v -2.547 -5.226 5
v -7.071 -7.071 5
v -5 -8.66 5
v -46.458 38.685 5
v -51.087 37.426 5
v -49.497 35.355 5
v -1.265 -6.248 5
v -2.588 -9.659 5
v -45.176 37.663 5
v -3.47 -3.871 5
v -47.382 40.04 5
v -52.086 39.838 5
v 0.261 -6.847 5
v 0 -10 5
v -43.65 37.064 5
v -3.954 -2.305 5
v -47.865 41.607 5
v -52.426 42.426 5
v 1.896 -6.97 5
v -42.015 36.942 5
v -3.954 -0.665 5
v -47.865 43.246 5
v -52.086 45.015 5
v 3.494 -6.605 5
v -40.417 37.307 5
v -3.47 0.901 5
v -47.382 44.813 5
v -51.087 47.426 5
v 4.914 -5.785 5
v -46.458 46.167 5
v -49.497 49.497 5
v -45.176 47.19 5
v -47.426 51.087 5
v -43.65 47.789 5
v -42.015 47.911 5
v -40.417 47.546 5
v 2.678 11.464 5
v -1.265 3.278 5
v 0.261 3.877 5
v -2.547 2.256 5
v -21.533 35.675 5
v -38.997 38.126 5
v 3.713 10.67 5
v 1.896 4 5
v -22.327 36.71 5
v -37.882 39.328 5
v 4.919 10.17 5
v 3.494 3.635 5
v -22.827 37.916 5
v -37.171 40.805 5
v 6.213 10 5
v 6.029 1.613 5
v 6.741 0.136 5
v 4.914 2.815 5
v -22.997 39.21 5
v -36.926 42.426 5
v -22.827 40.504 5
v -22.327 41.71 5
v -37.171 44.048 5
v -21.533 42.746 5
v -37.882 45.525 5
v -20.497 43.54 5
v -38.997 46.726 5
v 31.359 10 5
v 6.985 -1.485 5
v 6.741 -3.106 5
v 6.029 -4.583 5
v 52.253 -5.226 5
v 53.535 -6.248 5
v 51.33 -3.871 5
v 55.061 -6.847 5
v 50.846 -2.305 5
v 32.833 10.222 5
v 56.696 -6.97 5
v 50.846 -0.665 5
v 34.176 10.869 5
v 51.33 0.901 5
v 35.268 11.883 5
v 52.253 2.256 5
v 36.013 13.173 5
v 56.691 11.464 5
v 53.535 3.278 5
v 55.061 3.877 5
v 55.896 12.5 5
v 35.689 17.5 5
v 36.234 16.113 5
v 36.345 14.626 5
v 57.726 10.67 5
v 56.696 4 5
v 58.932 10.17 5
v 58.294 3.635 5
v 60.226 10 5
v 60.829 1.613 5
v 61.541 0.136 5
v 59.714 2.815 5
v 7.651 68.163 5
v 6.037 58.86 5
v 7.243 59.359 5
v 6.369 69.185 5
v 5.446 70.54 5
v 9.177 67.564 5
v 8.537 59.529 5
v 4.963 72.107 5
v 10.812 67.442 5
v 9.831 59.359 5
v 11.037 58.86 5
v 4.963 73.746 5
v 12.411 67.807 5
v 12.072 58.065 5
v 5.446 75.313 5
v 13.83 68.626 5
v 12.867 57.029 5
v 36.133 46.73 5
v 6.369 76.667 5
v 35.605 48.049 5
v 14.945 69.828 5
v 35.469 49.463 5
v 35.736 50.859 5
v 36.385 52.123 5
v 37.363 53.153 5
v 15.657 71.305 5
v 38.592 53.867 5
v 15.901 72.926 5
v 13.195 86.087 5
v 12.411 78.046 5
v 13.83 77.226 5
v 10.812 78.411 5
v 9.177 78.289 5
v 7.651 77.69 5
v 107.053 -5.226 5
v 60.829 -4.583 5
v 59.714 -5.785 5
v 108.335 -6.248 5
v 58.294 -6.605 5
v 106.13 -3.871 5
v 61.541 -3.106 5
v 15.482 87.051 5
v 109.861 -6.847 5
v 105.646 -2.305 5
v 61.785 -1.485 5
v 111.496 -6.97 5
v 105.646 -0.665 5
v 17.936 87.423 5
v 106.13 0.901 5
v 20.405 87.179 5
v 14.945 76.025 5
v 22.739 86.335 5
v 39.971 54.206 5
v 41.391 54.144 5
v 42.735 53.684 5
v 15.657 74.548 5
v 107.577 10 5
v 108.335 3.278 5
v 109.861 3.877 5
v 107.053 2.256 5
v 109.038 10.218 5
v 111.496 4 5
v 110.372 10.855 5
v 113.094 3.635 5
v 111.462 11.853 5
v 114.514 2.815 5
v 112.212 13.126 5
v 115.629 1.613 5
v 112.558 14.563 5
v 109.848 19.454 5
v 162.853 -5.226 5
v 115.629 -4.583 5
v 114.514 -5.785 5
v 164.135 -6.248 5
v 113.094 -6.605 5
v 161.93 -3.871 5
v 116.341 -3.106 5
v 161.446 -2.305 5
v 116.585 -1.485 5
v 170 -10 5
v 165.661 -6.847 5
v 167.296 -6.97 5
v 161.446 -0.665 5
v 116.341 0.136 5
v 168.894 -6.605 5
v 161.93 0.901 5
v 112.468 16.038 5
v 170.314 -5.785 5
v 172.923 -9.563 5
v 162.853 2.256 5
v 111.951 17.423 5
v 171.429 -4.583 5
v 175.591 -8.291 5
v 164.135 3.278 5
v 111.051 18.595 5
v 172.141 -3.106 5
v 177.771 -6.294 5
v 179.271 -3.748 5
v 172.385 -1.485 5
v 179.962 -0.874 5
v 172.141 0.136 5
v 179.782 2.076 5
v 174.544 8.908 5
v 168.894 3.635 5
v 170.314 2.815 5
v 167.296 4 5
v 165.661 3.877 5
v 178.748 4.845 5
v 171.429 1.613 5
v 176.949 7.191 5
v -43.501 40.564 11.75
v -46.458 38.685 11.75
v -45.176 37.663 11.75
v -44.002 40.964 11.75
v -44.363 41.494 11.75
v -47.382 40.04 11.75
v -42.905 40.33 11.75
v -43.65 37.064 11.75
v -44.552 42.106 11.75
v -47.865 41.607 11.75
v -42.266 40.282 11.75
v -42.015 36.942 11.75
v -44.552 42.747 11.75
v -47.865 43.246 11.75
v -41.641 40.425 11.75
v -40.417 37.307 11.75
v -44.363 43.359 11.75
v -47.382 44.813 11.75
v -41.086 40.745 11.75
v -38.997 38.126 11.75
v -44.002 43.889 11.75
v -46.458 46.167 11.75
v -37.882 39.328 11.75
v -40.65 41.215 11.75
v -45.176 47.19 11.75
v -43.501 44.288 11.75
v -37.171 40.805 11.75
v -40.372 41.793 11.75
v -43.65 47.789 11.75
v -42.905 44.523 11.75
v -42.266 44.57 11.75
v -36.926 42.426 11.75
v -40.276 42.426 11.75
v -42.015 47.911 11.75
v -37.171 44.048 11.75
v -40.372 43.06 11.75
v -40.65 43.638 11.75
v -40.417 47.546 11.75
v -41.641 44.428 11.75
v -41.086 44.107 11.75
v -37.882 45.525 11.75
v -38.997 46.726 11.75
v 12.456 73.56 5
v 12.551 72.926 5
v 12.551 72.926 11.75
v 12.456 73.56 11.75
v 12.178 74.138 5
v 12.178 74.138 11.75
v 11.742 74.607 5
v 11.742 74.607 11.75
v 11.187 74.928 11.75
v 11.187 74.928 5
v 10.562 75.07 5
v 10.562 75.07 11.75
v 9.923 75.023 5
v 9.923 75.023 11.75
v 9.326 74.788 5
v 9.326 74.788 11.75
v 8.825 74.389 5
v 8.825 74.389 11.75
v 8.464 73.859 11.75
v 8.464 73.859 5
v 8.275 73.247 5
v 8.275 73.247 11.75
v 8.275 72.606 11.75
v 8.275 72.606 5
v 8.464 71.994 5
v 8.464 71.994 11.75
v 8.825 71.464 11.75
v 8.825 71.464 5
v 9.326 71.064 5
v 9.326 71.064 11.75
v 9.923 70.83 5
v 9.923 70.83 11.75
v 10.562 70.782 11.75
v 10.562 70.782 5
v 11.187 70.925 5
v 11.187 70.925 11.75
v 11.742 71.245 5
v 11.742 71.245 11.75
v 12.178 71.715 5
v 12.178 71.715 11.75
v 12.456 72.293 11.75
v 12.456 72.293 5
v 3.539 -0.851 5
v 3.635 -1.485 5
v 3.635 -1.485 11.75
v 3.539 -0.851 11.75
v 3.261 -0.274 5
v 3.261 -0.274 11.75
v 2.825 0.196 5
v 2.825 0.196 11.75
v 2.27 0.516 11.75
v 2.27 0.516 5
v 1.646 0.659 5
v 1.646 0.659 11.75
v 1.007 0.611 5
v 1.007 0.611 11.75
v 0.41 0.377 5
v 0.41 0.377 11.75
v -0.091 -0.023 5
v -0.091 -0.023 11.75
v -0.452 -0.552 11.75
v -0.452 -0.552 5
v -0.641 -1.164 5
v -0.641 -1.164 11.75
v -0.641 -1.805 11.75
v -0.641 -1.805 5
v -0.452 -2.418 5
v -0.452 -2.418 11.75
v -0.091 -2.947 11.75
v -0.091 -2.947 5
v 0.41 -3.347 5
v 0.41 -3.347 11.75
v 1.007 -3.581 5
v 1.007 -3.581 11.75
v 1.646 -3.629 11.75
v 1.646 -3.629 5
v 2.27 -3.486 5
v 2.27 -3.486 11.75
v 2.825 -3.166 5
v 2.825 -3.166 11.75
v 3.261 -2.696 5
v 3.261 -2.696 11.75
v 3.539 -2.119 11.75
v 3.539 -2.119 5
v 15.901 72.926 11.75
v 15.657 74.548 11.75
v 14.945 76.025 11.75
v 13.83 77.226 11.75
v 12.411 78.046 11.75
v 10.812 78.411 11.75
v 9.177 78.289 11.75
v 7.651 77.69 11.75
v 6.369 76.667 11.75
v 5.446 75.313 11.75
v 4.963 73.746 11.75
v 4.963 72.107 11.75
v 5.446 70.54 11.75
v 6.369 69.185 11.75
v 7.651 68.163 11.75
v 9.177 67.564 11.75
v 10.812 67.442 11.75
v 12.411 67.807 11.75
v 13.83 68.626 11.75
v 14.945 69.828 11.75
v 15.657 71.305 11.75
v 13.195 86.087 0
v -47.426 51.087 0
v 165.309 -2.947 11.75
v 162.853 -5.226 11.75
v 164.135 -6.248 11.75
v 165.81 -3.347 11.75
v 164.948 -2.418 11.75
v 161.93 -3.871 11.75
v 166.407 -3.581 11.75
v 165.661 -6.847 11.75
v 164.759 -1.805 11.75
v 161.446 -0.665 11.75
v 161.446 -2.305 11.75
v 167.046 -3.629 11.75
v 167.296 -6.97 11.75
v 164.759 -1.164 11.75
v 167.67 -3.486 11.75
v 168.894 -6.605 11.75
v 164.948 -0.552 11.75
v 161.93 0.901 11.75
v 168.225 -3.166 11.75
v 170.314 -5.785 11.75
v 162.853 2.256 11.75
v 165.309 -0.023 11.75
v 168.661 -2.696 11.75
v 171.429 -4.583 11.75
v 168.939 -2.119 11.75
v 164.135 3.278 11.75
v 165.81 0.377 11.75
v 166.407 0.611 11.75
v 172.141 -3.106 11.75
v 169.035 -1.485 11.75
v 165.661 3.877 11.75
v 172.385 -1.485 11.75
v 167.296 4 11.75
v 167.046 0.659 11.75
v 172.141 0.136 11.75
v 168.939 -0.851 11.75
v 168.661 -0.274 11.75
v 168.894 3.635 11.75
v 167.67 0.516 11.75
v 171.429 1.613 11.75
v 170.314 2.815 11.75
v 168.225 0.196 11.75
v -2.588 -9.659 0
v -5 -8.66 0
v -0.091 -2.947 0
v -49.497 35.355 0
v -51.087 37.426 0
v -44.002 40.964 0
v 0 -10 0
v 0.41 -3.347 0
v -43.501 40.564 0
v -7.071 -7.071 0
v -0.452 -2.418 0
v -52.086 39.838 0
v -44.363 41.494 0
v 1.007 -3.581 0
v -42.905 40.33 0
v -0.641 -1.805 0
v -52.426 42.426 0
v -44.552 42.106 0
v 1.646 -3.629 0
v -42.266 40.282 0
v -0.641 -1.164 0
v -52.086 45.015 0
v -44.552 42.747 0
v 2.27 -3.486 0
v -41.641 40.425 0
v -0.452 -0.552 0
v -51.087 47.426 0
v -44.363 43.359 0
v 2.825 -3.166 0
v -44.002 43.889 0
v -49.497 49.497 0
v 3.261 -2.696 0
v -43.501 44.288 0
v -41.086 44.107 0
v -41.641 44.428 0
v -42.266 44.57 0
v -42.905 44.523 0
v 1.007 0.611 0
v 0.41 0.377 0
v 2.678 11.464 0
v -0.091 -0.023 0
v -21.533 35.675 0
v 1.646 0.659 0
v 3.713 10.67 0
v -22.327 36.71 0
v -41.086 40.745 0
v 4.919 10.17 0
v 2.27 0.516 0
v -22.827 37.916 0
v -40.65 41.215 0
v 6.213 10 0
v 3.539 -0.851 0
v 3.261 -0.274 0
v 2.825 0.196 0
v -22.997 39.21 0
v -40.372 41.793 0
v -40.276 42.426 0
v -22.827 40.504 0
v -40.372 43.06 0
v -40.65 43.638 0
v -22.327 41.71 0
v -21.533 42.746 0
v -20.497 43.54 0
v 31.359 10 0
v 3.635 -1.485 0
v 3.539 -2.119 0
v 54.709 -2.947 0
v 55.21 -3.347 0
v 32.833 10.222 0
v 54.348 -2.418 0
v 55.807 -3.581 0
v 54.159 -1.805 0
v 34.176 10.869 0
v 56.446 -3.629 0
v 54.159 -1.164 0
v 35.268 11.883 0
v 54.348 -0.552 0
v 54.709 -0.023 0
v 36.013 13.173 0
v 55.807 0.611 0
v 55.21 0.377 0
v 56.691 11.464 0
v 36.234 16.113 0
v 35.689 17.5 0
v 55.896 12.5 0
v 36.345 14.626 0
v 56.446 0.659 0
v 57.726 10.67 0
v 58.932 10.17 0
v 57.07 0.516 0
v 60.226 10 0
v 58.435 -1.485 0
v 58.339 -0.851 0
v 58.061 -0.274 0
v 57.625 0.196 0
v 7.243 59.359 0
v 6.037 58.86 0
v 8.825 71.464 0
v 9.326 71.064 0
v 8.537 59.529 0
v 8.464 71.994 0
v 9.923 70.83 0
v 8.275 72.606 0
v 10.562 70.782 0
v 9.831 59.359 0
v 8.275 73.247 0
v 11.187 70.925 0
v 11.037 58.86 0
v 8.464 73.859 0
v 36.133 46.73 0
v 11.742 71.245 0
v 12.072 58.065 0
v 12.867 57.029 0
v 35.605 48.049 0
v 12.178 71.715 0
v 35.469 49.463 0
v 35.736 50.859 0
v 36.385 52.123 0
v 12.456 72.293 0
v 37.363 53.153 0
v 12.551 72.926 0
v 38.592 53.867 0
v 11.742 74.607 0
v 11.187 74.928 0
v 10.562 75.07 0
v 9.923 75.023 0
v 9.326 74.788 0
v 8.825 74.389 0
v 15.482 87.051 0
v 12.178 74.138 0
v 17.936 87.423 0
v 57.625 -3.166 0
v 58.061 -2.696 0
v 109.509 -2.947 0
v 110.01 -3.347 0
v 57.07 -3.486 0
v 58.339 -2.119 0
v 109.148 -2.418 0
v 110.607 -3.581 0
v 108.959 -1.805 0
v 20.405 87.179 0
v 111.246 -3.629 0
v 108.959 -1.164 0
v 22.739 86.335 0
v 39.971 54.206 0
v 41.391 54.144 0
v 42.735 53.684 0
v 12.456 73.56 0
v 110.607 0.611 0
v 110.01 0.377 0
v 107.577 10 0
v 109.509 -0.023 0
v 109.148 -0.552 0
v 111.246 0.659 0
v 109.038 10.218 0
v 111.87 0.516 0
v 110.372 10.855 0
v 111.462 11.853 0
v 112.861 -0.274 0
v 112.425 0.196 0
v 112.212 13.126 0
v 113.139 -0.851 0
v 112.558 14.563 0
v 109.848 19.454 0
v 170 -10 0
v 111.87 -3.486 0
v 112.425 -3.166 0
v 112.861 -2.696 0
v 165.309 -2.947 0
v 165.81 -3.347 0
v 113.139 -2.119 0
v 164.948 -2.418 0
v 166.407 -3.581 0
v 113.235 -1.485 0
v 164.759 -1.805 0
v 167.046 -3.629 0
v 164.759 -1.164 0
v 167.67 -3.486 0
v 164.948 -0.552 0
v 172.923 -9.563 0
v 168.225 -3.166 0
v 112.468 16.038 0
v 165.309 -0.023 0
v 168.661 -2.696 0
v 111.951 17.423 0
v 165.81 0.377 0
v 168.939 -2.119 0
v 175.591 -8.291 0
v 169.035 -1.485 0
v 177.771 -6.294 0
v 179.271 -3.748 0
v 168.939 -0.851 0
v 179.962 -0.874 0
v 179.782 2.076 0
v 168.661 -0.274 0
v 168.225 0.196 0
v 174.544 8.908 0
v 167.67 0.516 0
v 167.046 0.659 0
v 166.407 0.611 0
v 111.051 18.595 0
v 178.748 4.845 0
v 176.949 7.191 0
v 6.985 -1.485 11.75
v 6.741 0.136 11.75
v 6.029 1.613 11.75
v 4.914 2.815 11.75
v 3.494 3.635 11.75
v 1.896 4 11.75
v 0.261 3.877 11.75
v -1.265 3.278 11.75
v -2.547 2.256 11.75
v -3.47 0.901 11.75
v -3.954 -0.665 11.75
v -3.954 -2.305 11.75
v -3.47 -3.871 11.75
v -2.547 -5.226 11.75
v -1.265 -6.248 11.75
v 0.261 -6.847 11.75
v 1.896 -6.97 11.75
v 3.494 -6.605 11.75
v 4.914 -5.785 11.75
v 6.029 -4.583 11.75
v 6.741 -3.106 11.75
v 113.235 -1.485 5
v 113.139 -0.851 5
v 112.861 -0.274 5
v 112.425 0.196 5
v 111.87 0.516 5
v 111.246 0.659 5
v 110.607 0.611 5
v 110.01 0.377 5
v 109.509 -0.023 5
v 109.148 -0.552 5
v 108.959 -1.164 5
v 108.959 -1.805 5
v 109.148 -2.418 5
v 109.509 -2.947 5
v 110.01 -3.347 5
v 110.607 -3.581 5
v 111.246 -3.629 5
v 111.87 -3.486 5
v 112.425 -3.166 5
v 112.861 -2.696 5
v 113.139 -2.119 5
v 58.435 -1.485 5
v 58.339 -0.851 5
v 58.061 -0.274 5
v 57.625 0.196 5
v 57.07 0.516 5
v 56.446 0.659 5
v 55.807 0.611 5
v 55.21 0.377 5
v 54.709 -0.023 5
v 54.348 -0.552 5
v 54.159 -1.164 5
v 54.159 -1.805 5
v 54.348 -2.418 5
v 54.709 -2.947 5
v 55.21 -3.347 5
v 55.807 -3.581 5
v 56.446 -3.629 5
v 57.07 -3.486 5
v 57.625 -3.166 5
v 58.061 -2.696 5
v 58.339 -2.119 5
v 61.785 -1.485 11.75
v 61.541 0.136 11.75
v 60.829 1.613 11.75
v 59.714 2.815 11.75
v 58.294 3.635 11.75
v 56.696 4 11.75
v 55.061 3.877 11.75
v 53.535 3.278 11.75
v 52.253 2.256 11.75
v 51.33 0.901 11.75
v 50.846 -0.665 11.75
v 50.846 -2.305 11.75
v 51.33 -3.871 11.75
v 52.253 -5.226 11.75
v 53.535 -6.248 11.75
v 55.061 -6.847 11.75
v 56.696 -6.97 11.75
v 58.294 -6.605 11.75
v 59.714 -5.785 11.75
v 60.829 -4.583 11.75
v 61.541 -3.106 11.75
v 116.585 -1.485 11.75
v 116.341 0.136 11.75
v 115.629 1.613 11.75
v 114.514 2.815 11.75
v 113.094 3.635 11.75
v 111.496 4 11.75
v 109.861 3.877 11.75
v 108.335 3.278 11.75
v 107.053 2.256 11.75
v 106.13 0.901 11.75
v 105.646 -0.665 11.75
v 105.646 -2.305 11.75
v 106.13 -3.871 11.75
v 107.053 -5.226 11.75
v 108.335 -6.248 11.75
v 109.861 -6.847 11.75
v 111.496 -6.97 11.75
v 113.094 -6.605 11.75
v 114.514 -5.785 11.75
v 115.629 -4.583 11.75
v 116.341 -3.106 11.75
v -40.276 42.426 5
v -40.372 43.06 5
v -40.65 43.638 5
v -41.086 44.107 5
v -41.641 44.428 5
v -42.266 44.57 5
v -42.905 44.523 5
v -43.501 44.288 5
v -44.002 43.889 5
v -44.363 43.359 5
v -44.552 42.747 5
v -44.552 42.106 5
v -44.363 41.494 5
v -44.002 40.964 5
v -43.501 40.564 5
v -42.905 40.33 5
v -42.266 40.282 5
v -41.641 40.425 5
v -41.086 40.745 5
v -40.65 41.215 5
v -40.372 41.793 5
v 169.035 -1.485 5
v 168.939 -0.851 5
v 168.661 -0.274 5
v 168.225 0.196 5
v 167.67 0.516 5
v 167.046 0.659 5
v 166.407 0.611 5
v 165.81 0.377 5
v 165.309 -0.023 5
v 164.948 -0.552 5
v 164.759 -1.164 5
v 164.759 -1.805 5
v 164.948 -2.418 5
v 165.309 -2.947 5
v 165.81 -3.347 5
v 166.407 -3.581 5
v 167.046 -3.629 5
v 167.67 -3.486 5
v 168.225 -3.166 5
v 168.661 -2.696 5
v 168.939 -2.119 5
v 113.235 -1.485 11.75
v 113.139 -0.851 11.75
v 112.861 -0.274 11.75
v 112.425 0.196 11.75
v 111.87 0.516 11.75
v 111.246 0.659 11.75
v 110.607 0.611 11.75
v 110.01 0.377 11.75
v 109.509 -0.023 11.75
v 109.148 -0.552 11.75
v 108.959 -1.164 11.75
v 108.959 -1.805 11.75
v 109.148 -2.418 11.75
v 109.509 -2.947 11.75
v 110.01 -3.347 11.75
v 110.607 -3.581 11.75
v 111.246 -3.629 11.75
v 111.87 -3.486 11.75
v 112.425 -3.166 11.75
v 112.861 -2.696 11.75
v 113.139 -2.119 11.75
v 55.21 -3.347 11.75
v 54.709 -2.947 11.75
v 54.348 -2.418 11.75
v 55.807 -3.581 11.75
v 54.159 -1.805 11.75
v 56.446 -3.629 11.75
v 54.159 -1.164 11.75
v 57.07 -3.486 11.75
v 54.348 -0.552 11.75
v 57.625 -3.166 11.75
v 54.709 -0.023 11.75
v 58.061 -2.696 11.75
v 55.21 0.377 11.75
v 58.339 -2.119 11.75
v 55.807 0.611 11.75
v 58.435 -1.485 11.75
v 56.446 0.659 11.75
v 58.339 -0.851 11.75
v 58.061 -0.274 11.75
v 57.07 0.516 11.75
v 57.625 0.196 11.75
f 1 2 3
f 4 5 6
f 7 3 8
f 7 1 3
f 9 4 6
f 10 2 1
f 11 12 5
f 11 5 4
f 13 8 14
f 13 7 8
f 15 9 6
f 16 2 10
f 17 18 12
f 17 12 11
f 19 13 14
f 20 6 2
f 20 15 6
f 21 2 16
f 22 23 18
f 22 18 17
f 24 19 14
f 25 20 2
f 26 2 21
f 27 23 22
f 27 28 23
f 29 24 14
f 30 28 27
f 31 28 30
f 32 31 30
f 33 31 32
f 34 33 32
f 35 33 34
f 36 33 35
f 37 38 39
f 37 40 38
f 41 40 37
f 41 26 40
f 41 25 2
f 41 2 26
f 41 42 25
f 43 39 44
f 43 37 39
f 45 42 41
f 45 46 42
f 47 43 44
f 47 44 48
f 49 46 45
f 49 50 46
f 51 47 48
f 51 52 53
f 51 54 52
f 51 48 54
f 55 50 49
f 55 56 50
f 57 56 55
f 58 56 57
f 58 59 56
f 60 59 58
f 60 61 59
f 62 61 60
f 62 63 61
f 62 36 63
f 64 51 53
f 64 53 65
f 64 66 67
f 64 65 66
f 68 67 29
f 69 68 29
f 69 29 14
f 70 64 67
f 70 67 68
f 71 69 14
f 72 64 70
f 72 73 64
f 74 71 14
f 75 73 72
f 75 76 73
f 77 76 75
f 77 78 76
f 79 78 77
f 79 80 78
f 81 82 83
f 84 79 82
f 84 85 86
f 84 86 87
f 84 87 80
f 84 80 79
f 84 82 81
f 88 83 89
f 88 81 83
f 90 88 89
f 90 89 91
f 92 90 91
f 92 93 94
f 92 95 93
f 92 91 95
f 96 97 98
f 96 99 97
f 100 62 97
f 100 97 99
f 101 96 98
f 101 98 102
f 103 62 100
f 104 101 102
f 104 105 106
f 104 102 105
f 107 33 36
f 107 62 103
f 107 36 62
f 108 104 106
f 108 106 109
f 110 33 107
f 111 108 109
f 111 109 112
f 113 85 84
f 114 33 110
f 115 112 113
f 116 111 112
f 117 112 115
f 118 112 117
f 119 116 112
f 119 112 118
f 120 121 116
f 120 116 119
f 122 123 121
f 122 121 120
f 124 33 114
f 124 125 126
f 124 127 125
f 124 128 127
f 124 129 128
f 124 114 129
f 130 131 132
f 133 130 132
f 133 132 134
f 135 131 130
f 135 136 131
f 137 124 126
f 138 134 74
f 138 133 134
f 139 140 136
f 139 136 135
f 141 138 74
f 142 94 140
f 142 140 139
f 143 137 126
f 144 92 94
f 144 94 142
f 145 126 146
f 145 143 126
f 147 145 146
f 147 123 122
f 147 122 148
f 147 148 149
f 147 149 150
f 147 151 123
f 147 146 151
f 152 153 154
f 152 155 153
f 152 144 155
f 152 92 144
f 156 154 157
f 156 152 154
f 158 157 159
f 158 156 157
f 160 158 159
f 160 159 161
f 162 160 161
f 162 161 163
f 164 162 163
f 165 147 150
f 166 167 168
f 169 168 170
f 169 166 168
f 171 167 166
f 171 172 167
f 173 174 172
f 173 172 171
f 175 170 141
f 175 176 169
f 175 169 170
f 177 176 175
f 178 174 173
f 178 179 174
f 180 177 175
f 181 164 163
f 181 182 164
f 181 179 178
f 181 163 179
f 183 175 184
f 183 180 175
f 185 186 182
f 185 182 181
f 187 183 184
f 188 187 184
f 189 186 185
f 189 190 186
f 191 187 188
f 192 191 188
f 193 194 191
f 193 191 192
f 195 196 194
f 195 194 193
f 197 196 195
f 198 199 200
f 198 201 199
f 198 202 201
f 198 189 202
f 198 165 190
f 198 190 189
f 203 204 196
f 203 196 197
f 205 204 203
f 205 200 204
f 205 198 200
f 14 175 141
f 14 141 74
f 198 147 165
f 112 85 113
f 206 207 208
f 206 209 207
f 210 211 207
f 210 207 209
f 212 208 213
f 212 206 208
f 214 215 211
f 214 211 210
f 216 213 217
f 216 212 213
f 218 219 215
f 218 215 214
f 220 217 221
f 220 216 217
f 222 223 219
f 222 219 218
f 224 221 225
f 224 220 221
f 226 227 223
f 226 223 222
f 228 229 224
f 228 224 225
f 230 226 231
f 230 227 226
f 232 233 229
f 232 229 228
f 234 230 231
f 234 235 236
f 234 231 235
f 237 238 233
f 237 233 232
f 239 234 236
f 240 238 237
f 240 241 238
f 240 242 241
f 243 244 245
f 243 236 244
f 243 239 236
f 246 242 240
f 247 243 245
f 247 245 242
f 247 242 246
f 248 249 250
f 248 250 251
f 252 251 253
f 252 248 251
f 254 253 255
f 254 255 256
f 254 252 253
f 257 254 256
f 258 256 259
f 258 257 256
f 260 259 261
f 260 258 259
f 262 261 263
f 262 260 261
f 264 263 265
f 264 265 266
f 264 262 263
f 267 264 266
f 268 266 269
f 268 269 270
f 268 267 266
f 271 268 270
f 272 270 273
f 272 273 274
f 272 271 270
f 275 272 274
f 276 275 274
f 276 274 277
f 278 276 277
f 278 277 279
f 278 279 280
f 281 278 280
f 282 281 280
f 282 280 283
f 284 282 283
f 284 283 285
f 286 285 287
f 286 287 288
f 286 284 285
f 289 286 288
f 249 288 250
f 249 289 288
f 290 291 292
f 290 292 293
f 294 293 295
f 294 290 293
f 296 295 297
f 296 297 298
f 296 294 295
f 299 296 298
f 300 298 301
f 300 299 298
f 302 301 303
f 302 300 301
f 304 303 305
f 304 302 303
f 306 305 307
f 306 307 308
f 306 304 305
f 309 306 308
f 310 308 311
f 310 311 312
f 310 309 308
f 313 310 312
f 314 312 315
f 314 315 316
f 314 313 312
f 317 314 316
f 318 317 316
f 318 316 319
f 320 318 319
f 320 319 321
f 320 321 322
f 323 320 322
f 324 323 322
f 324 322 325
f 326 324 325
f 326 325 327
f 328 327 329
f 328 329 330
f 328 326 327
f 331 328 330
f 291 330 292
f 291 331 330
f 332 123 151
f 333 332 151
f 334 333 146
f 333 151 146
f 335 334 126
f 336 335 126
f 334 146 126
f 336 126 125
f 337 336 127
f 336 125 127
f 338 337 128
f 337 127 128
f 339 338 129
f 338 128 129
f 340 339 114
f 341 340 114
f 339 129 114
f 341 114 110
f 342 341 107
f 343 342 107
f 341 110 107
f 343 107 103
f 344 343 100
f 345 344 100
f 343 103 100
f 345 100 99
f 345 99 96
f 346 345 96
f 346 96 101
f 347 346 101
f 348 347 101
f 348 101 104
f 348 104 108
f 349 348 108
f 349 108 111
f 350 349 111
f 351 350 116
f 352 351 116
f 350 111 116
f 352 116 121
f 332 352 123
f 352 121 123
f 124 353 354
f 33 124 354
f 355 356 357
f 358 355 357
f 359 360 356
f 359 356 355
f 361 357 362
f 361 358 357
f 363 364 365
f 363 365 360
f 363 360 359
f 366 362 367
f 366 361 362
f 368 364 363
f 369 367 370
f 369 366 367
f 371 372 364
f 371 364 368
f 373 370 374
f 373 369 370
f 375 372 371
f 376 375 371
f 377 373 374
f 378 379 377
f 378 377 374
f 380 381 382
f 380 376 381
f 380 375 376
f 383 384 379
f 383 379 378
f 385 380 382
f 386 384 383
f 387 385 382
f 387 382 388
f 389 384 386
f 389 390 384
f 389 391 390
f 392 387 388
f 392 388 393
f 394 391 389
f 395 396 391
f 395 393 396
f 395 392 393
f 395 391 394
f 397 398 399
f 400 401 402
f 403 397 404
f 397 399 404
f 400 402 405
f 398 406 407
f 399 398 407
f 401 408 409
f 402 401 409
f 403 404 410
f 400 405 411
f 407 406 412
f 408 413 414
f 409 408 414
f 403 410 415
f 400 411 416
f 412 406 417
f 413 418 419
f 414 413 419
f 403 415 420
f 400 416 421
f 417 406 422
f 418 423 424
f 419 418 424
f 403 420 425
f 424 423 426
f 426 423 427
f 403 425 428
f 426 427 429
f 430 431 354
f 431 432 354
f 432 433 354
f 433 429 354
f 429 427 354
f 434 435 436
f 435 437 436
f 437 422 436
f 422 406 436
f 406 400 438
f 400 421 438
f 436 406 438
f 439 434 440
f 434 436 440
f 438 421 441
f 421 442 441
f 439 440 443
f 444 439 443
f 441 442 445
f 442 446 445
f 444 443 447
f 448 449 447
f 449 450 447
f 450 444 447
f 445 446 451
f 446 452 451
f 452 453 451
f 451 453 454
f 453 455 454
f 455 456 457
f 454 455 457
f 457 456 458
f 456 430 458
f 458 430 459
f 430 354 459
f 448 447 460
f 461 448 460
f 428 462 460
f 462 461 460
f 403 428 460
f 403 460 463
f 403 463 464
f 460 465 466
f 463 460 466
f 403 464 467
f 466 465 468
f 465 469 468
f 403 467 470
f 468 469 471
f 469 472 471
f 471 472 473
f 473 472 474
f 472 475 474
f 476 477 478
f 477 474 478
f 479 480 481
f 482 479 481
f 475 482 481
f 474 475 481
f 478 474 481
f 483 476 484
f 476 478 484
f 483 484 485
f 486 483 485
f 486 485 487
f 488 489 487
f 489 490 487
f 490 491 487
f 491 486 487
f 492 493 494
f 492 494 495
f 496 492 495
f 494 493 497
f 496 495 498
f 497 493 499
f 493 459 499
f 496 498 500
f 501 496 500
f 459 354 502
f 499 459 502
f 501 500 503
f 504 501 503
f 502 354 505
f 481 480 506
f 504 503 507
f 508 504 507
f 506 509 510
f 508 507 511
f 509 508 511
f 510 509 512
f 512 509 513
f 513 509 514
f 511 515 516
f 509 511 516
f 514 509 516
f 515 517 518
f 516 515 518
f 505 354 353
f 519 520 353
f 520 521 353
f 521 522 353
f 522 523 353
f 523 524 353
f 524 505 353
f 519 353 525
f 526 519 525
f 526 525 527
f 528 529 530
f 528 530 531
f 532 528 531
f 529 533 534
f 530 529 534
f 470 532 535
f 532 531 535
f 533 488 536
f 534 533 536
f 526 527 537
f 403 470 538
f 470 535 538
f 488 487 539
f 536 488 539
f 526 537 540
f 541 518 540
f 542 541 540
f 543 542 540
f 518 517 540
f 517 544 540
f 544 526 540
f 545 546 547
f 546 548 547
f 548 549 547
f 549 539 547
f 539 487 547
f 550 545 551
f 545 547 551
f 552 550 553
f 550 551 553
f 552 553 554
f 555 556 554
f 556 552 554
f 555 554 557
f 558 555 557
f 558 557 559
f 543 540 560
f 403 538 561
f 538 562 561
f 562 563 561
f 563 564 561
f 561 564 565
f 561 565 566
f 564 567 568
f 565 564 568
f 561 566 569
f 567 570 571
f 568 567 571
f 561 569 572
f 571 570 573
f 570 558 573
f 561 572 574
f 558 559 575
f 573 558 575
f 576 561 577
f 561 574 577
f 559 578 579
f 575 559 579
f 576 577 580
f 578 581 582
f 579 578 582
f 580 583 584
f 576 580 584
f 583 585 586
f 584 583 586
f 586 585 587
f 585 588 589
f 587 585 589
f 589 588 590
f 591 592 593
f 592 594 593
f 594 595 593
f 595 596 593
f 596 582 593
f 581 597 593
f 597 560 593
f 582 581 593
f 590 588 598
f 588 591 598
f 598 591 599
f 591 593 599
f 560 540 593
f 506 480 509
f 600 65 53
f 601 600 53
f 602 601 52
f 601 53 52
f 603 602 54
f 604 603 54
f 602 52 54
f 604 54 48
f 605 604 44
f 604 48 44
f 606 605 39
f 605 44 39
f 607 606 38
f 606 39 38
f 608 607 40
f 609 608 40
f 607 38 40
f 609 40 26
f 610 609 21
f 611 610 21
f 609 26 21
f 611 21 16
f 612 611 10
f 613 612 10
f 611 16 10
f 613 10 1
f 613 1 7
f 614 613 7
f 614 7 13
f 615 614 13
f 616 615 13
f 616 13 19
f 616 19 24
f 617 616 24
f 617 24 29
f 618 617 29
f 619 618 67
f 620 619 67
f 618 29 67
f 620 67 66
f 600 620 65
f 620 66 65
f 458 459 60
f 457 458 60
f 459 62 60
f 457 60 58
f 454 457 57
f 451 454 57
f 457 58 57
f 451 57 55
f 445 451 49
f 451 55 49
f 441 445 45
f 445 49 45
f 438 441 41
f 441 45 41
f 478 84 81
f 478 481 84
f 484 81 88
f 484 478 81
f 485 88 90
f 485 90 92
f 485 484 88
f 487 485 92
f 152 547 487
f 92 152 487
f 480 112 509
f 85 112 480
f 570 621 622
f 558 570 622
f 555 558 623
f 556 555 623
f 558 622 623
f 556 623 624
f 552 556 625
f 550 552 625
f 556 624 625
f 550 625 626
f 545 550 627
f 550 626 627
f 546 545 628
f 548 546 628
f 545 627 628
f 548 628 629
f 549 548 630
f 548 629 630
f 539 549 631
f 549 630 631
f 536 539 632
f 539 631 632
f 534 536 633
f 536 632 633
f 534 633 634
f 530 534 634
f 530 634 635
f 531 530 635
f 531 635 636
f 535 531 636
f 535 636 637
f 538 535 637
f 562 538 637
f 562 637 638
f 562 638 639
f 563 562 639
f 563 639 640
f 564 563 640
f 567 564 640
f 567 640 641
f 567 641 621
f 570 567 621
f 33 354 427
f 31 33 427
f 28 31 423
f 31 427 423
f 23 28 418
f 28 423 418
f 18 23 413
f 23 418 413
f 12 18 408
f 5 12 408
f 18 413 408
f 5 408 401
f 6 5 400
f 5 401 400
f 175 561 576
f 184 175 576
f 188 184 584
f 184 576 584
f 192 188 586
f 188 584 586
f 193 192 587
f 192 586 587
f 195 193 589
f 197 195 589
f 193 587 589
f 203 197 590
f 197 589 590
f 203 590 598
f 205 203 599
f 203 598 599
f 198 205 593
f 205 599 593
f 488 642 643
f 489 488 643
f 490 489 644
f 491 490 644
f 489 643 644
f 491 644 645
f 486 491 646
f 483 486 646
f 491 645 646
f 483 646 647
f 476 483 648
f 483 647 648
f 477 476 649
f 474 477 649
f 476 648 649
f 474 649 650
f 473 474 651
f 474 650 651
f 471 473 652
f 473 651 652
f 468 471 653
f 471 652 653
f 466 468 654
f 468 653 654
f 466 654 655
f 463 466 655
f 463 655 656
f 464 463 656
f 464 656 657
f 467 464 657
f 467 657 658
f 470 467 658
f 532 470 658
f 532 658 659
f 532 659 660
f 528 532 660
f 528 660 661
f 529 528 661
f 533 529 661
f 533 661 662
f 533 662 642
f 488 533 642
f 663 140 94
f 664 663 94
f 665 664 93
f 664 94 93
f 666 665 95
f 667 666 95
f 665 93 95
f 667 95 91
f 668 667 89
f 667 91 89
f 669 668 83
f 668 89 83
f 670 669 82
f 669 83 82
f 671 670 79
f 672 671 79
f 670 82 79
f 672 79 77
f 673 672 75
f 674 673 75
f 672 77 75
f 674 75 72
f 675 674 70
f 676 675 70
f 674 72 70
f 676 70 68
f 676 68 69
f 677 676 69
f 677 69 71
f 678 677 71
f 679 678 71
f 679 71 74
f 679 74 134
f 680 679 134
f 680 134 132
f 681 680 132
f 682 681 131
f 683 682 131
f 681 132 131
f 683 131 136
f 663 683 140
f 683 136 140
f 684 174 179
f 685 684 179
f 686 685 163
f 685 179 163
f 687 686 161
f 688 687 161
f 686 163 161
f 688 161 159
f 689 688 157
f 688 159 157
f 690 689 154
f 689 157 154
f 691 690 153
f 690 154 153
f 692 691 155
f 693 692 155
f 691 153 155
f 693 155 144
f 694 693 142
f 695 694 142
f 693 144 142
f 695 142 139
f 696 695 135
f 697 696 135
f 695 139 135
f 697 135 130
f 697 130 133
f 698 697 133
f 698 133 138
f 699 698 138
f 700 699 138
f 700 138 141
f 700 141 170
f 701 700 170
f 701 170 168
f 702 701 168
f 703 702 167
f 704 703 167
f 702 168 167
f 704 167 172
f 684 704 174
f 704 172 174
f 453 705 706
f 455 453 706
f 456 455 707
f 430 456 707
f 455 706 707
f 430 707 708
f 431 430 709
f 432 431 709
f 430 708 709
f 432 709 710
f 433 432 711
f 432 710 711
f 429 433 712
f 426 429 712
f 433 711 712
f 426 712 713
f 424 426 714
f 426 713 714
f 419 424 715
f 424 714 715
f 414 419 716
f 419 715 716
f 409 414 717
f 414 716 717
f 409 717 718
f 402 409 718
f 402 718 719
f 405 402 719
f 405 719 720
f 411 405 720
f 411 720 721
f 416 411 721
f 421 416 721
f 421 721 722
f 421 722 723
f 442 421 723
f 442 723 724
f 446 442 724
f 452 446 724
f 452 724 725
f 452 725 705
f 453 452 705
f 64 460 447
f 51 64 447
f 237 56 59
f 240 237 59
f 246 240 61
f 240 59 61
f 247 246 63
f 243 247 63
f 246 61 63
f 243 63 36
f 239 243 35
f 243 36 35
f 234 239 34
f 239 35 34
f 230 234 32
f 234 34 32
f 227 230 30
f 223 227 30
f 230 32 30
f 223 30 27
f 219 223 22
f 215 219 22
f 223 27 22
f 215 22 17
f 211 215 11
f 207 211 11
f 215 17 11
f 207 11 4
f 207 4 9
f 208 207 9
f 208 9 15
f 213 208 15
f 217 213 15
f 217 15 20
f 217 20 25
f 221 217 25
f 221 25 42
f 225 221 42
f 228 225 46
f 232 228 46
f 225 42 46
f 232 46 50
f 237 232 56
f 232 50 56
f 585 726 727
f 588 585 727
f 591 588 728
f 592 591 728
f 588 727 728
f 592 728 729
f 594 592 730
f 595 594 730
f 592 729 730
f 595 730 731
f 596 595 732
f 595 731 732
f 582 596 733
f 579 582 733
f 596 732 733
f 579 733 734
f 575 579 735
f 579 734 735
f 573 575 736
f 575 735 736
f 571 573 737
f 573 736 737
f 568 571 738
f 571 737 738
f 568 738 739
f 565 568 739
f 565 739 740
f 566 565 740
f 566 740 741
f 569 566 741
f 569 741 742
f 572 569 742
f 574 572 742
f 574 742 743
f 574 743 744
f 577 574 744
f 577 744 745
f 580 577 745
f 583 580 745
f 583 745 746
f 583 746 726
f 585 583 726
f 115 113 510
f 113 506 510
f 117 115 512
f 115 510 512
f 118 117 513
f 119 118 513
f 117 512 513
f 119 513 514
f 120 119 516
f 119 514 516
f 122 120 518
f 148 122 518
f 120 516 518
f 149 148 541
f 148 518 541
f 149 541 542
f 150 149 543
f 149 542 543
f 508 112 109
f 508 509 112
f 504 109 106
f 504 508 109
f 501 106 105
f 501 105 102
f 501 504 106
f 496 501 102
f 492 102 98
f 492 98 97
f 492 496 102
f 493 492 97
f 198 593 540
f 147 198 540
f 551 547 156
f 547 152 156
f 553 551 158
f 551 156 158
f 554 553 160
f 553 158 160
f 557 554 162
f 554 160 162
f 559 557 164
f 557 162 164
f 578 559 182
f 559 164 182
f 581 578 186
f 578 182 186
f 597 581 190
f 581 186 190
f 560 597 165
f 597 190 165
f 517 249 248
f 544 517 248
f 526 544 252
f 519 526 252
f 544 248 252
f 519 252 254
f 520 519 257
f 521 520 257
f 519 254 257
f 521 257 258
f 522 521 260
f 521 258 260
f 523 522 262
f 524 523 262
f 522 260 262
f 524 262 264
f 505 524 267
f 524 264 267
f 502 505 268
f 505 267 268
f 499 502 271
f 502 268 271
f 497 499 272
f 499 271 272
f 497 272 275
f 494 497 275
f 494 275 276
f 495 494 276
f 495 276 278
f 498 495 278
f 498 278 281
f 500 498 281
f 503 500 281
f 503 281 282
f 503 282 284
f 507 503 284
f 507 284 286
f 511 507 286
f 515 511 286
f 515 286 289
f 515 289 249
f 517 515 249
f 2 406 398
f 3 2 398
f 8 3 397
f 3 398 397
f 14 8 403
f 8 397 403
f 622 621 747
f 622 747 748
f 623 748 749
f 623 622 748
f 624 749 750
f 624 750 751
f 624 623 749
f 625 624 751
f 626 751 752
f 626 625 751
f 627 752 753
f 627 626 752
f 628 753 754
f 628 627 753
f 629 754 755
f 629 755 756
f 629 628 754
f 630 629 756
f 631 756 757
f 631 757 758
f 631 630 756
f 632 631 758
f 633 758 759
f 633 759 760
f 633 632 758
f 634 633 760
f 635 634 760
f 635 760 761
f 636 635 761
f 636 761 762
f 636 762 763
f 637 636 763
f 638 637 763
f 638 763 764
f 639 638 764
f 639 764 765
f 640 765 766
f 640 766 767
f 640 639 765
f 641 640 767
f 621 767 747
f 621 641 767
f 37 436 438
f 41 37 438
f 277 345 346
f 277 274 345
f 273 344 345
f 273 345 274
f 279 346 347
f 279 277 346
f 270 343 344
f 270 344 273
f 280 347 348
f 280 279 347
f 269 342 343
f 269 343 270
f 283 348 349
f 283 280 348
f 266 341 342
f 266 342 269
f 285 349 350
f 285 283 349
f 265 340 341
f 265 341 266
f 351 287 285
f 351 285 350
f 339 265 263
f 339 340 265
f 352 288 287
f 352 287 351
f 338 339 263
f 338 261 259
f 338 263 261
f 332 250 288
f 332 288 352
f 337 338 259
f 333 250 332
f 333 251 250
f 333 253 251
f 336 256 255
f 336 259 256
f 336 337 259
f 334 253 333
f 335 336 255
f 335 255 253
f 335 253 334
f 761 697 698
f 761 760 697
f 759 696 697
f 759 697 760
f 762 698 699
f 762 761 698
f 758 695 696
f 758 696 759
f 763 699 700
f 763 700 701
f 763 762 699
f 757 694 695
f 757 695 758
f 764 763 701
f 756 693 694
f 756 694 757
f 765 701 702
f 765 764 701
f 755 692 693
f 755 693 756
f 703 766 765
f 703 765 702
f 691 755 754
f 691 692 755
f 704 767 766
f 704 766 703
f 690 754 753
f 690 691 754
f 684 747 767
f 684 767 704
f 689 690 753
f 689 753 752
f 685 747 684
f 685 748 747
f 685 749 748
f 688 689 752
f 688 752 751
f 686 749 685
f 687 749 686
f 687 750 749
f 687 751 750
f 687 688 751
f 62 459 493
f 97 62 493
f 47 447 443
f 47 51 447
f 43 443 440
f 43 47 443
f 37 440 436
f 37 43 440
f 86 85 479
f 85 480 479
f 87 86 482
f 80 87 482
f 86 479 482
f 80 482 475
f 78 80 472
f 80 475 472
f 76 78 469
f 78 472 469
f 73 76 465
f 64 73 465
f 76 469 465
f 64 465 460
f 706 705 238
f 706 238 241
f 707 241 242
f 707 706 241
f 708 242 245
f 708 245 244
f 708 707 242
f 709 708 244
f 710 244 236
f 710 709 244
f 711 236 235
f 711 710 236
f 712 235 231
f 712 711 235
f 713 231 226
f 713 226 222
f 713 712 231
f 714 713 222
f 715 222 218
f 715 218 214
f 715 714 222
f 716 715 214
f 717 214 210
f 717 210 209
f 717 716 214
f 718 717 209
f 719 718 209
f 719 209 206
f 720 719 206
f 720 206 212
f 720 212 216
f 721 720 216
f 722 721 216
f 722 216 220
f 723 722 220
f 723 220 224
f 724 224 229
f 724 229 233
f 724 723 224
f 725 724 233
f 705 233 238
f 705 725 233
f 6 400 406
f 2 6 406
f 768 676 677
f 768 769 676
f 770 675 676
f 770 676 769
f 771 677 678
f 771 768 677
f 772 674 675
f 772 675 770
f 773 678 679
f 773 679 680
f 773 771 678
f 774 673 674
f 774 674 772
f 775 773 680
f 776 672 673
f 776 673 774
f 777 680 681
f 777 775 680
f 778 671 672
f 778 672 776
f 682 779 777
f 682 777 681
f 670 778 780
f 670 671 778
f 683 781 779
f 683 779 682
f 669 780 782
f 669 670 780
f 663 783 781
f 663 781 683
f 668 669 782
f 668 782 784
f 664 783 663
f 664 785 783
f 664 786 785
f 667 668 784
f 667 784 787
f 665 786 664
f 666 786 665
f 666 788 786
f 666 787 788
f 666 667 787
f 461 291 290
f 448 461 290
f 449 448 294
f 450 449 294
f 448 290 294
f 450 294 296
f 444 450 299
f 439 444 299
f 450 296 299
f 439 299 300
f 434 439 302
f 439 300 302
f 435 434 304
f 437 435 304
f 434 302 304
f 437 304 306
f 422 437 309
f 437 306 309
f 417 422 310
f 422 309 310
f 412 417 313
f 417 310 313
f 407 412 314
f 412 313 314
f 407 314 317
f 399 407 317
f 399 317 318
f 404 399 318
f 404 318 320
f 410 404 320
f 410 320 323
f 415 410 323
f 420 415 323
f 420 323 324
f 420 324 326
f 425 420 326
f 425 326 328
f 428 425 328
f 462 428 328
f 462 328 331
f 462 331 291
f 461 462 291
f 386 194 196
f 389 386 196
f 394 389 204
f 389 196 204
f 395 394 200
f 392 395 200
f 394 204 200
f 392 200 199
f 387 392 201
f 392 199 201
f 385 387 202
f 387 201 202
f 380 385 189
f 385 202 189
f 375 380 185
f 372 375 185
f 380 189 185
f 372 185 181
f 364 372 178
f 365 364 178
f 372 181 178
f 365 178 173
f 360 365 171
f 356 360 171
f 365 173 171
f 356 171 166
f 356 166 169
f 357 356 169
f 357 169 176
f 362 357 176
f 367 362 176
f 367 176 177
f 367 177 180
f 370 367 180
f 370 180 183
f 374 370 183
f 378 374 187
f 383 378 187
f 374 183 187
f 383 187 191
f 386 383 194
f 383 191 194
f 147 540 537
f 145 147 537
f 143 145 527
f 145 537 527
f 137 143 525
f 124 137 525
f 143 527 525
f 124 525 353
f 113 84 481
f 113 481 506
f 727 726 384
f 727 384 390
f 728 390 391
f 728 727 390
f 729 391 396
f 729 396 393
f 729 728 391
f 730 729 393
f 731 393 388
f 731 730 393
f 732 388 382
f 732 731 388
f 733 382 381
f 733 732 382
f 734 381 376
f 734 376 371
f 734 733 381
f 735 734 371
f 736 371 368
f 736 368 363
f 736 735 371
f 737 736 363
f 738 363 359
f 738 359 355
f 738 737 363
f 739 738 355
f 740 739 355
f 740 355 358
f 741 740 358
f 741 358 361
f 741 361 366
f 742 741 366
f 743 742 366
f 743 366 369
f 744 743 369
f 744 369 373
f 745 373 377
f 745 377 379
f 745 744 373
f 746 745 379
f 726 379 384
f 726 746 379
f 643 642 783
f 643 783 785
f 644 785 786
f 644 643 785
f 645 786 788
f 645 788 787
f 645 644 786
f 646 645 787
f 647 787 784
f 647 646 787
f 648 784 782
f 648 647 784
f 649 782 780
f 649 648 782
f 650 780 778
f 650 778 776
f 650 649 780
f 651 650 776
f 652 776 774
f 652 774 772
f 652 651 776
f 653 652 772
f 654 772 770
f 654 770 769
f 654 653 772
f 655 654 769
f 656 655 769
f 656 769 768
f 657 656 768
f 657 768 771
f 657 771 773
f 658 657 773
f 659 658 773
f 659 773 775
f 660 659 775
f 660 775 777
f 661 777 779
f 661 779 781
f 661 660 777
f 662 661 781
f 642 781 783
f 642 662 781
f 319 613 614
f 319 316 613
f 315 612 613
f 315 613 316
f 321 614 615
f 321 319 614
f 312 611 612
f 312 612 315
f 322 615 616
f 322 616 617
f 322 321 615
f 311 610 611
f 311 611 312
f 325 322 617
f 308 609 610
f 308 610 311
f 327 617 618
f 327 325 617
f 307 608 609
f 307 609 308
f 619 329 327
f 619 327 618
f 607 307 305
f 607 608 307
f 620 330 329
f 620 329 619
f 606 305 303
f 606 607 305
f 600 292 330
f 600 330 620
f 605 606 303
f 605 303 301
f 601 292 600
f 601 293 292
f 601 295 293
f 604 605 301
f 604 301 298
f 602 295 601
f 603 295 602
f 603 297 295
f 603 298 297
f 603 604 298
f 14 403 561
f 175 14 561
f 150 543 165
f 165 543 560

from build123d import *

# Parameters (mm, degrees)
BOSS_EXTRUDE1_DEPTH = 5
BOSS_EXTRUDE2_DEPTH = 5
FILLET1_R           = 5
SKETCH3_R           = 5.5
SKETCH3_R_2         = 2.15
BOSS_EXTRUDE3_DEPTH = 6.75
SKETCH4_R           = 2.15
CUT_EXTRUDE1_DEPTH  = 6


with BuildPart() as part:
    # Sketch1 → Boss-Extrude1 (new body)
    with BuildSketch(Plane.XY):
        with BuildLine():
            Line((-35.355339059, 49.497474683), (-26.140144074, 40.282279698))
            Line((-26.140144074, 40.282279698), (18.49094778, 66.050052594))
            Line((18.49094778, 66.050052594), (13.651828996, 68.518195913))
            ThreePointArc((13.651828996, 68.518195913), (8.198744915, 77.166678081), (13.195371394, 86.086660909))
            Line((13.195371394, 86.086660909), (-47.426406871, 51.086660909))
            ThreePointArc((-47.426406871, 51.086660909), (-41.121144949, 52.340855485), (-35.355339059, 49.497474683))
        make_face()
        with BuildLine():
            Line((18.49094778, 66.050052594), (128.384429361, 10))
            Line((128.384429361, 10), (170, 10))
            ThreePointArc((170, 10), (172.336438573, 9.723222449), (174.543542397, 8.908210959))
            Line((174.543542397, 8.908210959), (22.738913791, 86.33461783))
            ThreePointArc((22.738913791, 86.33461783), (28.191997872, 77.686135661), (23.195371394, 68.766152833))
            Line((23.195371394, 68.766152833), (18.49094778, 66.050052594))
        make_face()
        with BuildLine():
            Line((128.384429361, 10), (4.142135624, 10))
            Line((4.142135624, 10), (7.071067812, 7.071067812))
            ThreePointArc((7.071067812, 7.071067812), (9.238795325, -3.826834324), (0, -10))
            Line((0, -10), (170, -10))
            ThreePointArc((170, -10), (167.663561427, -9.723222449), (165.456457603, -8.908210959))
            Line((165.456457603, -8.908210959), (128.384429361, 10))
        make_face()
        with BuildLine():
            ThreePointArc((-7.071067812, -7.071067812), (-9.238795325, 3.826834324), (0, 10))
            Line((0, 10), (4.142135624, 10))
            Line((4.142135624, 10), (-26.140144074, 40.282279698))
            Line((-26.140144074, 40.282279698), (-37.426406871, 33.766152833))
            ThreePointArc((-37.426406871, 33.766152833), (-43.731668793, 32.511958257), (-49.497474683, 35.355339059))
            Line((-49.497474683, 35.355339059), (-7.071067812, -7.071067812))
        make_face()
        with BuildLine():
            Line((170, 10), (128.384429361, 10))
            Line((128.384429361, 10), (165.456457603, -8.908210959))
            ThreePointArc((165.456457603, -8.908210959), (167.663561427, -9.723222449), (170, -10))
            ThreePointArc((170, -10), (179.723222449, -2.336438573), (174.543542397, 8.908210959))
            ThreePointArc((174.543542397, 8.908210959), (172.336438573, 9.723222449), (170, 10))
        make_face()
        with BuildLine():
            Line((13.651828996, 68.518195913), (18.49094778, 66.050052594))
            Line((18.49094778, 66.050052594), (23.195371394, 68.766152833))
            ThreePointArc((23.195371394, 68.766152833), (28.191997872, 77.686135661), (22.738913791, 86.33461783))
            ThreePointArc((22.738913791, 86.33461783), (17.935642604, 87.42303335), (13.195371394, 86.086660909))
            ThreePointArc((13.195371394, 86.086660909), (8.198744915, 77.166678081), (13.651828996, 68.518195913))
        make_face()
        with BuildLine():
            Line((-37.426406871, 33.766152833), (-26.140144074, 40.282279698))
            Line((-26.140144074, 40.282279698), (-35.355339059, 49.497474683))
            ThreePointArc((-35.355339059, 49.497474683), (-41.121144949, 52.340855485), (-47.426406871, 51.086660909))
            ThreePointArc((-47.426406871, 51.086660909), (-52.340855485, 43.731668793), (-49.497474683, 35.355339059))
            ThreePointArc((-49.497474683, 35.355339059), (-43.731668793, 32.511958257), (-37.426406871, 33.766152833))
        make_face()
        with BuildLine():
            Line((4.142135624, 10), (0, 10))
            ThreePointArc((0, 10), (-9.238795325, 3.826834324), (-7.071067812, -7.071067812))
            ThreePointArc((-7.071067812, -7.071067812), (-3.826834324, -9.238795325), (0, -10))
            ThreePointArc((0, -10), (9.238795325, -3.826834324), (7.071067812, 7.071067812))
            Line((7.071067812, 7.071067812), (4.142135624, 10))
        make_face()
    extrude(amount=BOSS_EXTRUDE1_DEPTH)

    # Sketch2 → Boss-Extrude2 (add, through all)
    with BuildSketch(Plane.XY.offset(5)):
        Polygon((18.49094778, 66.050052594), (10.366771374, 61.359557158), (40.019225525, 10), (57.3397336, 10), (27.687279449, 61.359557158), align=None)
    extrude(amount=-BOSS_EXTRUDE2_DEPTH)

    # Fillet1
    fillet1_edges = [part.edges().sort_by_distance(p)[0] for p in [
        (-26.140144074, 40.282279698, 2.5),
        (4.142135624, 10, 2.5),
        (128.384429361, 10, 2.5),
        (27.687279449, 61.359557158, 2.5),
        (57.3397336, 10, 2.5),
        (40.019225525, 10, 2.5),
        (10.366771374, 61.359557158, 2.5),
    ]]
    fillet(fillet1_edges, radius=FILLET1_R)

    # Sketch3 → Boss-Extrude3 (add)
    with BuildSketch(Plane.XY.offset(5)):
        with Locations((-42.426406871, 42.426406871)):
            Circle(SKETCH3_R)
        with Locations((-42.426406871, 42.426406871)):
            Circle(SKETCH3_R_2, mode=Mode.SUBTRACT)
        with Locations((1.48492424, -1.48492424)):
            Circle(SKETCH3_R)
        with Locations((1.48492424, -1.48492424)):
            Circle(SKETCH3_R_2, mode=Mode.SUBTRACT)
        with Locations((56.28492424, -1.48492424)):
            Circle(SKETCH3_R)
        with Locations((56.28492424, -1.48492424)):
            Circle(SKETCH3_R_2, mode=Mode.SUBTRACT)
        with Locations((111.08492424, -1.48492424)):
            Circle(SKETCH3_R)
        with Locations((111.08492424, -1.48492424)):
            Circle(SKETCH3_R_2, mode=Mode.SUBTRACT)
        with Locations((166.88492424, -1.48492424)):
            Circle(SKETCH3_R)
        with Locations((166.88492424, -1.48492424)):
            Circle(SKETCH3_R_2, mode=Mode.SUBTRACT)
        with Locations((10.40114276, 72.926406871)):
            Circle(SKETCH3_R)
        with Locations((10.40114276, 72.926406871)):
            Circle(SKETCH3_R_2, mode=Mode.SUBTRACT)
    extrude(amount=BOSS_EXTRUDE3_DEPTH)

    # Sketch4 → Cut-Extrude1 (cut, through all)
    with BuildSketch(Plane.XY.offset(5)):
        with Locations((-42.426406871, 42.426406871)):
            Circle(SKETCH4_R)
        with Locations((1.48492424, -1.48492424)):
            Circle(SKETCH4_R)
        with Locations((56.28492424, -1.48492424)):
            Circle(SKETCH4_R)
        with Locations((111.08492424, -1.48492424)):
            Circle(SKETCH4_R)
        with Locations((166.88492424, -1.48492424)):
            Circle(SKETCH4_R)
        with Locations((10.40114276, 72.926406871)):
            Circle(SKETCH4_R)
    extrude(amount=-CUT_EXTRUDE1_DEPTH, mode=Mode.SUBTRACT)


solid = part.part
